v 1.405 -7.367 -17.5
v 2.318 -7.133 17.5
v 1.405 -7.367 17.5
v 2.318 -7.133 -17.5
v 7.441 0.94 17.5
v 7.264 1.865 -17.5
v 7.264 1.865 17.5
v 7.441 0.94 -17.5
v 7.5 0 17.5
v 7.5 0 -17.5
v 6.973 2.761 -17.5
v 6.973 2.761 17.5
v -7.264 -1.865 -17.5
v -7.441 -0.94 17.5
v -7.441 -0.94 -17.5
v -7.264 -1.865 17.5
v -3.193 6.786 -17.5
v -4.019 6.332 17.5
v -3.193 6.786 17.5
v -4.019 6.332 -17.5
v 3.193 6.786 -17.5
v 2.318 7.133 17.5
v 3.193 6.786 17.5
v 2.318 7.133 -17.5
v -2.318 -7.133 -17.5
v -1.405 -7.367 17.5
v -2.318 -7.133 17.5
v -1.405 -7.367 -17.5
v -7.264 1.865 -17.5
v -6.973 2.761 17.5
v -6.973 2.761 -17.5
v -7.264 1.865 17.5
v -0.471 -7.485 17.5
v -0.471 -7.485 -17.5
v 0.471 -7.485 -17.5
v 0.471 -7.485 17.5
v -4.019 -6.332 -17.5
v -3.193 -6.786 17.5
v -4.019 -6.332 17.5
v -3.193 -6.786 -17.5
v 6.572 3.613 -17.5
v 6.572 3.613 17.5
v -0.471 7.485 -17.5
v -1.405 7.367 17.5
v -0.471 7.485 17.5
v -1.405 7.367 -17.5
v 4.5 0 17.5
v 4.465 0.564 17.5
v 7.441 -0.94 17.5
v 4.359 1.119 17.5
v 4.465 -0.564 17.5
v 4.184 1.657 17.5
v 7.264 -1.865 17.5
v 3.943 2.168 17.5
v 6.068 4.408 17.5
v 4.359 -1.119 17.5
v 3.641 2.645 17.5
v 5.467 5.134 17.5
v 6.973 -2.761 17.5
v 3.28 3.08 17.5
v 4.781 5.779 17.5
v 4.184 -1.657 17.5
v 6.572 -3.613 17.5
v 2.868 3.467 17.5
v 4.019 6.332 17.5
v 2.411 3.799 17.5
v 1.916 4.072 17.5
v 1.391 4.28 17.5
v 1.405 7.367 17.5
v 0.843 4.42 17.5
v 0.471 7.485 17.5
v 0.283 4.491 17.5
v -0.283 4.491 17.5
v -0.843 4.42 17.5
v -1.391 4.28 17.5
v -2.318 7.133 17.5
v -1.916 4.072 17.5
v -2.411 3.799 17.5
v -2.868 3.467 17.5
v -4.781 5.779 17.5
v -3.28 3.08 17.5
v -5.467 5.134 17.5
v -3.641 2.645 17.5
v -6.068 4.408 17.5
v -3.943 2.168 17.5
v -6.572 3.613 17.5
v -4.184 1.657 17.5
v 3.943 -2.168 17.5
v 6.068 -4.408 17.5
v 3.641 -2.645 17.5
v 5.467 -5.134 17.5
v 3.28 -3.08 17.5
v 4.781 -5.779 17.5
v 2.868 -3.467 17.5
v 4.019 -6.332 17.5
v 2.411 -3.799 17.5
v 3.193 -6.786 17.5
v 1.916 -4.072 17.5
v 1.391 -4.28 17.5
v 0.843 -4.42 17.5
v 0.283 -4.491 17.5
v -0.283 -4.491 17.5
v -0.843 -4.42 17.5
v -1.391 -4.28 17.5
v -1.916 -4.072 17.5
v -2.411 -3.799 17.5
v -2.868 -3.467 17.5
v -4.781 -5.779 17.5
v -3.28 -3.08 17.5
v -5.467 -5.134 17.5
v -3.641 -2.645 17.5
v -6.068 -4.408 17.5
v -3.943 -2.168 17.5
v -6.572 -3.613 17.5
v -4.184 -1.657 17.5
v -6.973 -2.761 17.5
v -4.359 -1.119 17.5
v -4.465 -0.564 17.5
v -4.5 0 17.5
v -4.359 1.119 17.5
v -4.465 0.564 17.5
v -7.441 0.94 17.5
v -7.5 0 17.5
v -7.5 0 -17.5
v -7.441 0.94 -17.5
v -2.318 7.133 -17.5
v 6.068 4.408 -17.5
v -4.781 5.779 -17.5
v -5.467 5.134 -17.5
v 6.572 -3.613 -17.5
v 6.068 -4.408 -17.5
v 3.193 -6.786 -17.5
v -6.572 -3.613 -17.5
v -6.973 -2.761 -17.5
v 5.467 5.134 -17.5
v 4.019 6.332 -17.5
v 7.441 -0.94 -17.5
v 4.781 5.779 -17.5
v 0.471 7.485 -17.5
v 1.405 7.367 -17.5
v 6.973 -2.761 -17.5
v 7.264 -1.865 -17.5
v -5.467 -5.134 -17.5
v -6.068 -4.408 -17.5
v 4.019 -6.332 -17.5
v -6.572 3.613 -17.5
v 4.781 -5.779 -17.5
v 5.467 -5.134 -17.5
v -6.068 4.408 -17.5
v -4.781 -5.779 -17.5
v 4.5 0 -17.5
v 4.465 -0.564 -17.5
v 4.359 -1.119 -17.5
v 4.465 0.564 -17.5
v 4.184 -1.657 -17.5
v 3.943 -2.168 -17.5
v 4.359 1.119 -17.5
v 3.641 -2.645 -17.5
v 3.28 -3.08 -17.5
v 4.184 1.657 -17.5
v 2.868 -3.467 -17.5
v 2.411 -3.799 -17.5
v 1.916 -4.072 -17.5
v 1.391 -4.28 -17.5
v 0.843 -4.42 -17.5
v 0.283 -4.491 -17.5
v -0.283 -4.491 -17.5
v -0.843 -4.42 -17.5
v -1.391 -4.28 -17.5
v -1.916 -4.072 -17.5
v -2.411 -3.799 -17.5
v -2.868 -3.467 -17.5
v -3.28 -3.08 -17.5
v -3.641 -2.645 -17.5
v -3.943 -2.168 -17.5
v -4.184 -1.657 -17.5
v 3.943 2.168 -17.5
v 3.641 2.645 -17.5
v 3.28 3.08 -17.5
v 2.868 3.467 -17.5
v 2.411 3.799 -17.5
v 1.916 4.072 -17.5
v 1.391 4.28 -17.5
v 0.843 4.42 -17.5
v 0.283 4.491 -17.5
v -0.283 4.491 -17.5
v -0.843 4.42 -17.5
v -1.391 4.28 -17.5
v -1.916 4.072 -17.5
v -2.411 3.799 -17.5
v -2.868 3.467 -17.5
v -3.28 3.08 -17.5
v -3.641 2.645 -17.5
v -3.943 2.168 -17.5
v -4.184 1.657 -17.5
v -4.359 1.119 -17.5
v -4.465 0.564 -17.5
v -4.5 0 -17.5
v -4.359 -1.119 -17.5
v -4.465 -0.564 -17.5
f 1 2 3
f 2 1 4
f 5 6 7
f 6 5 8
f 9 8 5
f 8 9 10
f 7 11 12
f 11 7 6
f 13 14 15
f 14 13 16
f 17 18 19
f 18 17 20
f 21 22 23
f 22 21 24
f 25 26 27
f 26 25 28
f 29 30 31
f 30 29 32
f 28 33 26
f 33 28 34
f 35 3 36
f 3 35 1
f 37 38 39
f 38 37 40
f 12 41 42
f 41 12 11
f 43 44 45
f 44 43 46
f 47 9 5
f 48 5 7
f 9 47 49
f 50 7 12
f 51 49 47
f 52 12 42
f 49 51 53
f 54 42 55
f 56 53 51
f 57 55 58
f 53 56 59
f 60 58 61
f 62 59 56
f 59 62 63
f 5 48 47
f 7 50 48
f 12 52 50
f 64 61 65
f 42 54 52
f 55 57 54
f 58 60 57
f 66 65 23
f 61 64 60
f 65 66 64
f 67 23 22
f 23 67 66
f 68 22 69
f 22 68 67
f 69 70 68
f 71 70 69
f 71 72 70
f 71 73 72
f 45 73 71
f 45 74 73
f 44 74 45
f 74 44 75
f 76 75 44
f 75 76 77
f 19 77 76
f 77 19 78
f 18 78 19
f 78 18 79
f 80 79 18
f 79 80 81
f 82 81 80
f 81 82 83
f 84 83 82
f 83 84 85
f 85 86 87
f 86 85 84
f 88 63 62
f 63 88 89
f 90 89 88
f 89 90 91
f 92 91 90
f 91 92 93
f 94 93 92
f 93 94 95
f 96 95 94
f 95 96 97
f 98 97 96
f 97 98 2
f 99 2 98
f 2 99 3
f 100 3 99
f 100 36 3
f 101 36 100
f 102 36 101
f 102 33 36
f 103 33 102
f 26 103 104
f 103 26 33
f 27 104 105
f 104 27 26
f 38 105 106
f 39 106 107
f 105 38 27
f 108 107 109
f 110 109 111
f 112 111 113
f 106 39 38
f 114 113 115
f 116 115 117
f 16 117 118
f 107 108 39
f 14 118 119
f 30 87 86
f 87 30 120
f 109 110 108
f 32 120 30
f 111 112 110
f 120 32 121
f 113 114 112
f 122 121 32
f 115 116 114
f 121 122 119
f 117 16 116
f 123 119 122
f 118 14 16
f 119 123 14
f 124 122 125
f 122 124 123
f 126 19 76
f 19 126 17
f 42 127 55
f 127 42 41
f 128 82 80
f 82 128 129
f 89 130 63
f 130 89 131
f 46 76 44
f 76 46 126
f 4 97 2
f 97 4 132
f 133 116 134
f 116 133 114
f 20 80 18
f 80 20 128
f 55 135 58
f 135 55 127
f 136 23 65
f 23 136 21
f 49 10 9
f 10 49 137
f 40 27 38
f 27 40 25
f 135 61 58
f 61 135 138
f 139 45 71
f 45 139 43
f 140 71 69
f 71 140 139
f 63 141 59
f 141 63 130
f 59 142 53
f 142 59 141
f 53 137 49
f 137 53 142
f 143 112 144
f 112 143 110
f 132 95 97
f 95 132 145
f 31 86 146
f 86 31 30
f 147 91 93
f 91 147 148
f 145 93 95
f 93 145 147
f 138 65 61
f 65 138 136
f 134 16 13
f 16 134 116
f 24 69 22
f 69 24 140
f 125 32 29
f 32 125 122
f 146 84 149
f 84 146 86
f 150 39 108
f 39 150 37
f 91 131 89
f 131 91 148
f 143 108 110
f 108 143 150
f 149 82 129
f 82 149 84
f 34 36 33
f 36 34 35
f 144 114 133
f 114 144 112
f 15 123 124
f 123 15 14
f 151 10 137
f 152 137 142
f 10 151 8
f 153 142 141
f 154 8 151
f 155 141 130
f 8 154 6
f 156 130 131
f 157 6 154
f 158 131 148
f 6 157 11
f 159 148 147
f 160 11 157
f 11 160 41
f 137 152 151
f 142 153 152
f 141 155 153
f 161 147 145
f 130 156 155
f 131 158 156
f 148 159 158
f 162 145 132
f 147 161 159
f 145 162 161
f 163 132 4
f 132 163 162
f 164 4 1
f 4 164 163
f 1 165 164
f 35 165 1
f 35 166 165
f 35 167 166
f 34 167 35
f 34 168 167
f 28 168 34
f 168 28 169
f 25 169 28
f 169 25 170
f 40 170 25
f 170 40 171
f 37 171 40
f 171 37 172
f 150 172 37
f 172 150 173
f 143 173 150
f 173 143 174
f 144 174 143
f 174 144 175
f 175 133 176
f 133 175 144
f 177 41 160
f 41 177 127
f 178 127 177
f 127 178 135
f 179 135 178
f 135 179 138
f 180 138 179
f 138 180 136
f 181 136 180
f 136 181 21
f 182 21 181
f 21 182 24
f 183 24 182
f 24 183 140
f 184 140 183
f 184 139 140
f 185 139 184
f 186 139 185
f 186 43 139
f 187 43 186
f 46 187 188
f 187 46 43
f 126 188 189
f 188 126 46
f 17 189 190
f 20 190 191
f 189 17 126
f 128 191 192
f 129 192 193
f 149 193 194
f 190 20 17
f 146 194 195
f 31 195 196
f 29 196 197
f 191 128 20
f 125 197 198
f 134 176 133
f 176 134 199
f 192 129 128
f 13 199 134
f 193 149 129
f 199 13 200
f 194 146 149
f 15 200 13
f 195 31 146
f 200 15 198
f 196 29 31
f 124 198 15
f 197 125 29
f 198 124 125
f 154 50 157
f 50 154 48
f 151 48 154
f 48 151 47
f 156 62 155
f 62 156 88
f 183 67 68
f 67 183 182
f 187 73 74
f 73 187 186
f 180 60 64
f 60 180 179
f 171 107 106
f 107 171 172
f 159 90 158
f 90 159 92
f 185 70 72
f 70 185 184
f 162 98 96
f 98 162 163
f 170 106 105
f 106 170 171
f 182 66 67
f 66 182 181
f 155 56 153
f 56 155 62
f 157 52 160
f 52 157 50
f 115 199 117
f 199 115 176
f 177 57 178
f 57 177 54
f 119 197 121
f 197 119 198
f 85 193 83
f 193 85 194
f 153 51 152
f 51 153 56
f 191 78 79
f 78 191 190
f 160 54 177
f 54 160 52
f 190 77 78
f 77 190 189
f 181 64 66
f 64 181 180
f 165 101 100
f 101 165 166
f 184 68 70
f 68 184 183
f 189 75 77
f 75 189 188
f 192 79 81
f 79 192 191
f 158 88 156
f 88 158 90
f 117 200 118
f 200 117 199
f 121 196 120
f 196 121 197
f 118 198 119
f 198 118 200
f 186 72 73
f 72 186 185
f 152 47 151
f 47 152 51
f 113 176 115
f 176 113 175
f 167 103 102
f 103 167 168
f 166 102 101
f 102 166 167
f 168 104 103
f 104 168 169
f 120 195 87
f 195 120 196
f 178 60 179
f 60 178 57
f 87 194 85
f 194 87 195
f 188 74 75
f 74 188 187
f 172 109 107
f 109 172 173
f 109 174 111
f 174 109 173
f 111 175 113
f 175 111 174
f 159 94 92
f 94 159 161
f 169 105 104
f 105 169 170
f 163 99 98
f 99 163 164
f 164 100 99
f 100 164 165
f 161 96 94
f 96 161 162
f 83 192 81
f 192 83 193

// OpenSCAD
$fn = 50;


difference() {
	union() {
		translate(v = [0, 0, -17.5000000000]) {
			cylinder(h = 35, r = 7.5000000000);
		}
	}
	union() {
		translate(v = [0, 0, -100.0000000000]) {
			cylinder(h = 200, r = 4.5000000000);
		}
	}
}
